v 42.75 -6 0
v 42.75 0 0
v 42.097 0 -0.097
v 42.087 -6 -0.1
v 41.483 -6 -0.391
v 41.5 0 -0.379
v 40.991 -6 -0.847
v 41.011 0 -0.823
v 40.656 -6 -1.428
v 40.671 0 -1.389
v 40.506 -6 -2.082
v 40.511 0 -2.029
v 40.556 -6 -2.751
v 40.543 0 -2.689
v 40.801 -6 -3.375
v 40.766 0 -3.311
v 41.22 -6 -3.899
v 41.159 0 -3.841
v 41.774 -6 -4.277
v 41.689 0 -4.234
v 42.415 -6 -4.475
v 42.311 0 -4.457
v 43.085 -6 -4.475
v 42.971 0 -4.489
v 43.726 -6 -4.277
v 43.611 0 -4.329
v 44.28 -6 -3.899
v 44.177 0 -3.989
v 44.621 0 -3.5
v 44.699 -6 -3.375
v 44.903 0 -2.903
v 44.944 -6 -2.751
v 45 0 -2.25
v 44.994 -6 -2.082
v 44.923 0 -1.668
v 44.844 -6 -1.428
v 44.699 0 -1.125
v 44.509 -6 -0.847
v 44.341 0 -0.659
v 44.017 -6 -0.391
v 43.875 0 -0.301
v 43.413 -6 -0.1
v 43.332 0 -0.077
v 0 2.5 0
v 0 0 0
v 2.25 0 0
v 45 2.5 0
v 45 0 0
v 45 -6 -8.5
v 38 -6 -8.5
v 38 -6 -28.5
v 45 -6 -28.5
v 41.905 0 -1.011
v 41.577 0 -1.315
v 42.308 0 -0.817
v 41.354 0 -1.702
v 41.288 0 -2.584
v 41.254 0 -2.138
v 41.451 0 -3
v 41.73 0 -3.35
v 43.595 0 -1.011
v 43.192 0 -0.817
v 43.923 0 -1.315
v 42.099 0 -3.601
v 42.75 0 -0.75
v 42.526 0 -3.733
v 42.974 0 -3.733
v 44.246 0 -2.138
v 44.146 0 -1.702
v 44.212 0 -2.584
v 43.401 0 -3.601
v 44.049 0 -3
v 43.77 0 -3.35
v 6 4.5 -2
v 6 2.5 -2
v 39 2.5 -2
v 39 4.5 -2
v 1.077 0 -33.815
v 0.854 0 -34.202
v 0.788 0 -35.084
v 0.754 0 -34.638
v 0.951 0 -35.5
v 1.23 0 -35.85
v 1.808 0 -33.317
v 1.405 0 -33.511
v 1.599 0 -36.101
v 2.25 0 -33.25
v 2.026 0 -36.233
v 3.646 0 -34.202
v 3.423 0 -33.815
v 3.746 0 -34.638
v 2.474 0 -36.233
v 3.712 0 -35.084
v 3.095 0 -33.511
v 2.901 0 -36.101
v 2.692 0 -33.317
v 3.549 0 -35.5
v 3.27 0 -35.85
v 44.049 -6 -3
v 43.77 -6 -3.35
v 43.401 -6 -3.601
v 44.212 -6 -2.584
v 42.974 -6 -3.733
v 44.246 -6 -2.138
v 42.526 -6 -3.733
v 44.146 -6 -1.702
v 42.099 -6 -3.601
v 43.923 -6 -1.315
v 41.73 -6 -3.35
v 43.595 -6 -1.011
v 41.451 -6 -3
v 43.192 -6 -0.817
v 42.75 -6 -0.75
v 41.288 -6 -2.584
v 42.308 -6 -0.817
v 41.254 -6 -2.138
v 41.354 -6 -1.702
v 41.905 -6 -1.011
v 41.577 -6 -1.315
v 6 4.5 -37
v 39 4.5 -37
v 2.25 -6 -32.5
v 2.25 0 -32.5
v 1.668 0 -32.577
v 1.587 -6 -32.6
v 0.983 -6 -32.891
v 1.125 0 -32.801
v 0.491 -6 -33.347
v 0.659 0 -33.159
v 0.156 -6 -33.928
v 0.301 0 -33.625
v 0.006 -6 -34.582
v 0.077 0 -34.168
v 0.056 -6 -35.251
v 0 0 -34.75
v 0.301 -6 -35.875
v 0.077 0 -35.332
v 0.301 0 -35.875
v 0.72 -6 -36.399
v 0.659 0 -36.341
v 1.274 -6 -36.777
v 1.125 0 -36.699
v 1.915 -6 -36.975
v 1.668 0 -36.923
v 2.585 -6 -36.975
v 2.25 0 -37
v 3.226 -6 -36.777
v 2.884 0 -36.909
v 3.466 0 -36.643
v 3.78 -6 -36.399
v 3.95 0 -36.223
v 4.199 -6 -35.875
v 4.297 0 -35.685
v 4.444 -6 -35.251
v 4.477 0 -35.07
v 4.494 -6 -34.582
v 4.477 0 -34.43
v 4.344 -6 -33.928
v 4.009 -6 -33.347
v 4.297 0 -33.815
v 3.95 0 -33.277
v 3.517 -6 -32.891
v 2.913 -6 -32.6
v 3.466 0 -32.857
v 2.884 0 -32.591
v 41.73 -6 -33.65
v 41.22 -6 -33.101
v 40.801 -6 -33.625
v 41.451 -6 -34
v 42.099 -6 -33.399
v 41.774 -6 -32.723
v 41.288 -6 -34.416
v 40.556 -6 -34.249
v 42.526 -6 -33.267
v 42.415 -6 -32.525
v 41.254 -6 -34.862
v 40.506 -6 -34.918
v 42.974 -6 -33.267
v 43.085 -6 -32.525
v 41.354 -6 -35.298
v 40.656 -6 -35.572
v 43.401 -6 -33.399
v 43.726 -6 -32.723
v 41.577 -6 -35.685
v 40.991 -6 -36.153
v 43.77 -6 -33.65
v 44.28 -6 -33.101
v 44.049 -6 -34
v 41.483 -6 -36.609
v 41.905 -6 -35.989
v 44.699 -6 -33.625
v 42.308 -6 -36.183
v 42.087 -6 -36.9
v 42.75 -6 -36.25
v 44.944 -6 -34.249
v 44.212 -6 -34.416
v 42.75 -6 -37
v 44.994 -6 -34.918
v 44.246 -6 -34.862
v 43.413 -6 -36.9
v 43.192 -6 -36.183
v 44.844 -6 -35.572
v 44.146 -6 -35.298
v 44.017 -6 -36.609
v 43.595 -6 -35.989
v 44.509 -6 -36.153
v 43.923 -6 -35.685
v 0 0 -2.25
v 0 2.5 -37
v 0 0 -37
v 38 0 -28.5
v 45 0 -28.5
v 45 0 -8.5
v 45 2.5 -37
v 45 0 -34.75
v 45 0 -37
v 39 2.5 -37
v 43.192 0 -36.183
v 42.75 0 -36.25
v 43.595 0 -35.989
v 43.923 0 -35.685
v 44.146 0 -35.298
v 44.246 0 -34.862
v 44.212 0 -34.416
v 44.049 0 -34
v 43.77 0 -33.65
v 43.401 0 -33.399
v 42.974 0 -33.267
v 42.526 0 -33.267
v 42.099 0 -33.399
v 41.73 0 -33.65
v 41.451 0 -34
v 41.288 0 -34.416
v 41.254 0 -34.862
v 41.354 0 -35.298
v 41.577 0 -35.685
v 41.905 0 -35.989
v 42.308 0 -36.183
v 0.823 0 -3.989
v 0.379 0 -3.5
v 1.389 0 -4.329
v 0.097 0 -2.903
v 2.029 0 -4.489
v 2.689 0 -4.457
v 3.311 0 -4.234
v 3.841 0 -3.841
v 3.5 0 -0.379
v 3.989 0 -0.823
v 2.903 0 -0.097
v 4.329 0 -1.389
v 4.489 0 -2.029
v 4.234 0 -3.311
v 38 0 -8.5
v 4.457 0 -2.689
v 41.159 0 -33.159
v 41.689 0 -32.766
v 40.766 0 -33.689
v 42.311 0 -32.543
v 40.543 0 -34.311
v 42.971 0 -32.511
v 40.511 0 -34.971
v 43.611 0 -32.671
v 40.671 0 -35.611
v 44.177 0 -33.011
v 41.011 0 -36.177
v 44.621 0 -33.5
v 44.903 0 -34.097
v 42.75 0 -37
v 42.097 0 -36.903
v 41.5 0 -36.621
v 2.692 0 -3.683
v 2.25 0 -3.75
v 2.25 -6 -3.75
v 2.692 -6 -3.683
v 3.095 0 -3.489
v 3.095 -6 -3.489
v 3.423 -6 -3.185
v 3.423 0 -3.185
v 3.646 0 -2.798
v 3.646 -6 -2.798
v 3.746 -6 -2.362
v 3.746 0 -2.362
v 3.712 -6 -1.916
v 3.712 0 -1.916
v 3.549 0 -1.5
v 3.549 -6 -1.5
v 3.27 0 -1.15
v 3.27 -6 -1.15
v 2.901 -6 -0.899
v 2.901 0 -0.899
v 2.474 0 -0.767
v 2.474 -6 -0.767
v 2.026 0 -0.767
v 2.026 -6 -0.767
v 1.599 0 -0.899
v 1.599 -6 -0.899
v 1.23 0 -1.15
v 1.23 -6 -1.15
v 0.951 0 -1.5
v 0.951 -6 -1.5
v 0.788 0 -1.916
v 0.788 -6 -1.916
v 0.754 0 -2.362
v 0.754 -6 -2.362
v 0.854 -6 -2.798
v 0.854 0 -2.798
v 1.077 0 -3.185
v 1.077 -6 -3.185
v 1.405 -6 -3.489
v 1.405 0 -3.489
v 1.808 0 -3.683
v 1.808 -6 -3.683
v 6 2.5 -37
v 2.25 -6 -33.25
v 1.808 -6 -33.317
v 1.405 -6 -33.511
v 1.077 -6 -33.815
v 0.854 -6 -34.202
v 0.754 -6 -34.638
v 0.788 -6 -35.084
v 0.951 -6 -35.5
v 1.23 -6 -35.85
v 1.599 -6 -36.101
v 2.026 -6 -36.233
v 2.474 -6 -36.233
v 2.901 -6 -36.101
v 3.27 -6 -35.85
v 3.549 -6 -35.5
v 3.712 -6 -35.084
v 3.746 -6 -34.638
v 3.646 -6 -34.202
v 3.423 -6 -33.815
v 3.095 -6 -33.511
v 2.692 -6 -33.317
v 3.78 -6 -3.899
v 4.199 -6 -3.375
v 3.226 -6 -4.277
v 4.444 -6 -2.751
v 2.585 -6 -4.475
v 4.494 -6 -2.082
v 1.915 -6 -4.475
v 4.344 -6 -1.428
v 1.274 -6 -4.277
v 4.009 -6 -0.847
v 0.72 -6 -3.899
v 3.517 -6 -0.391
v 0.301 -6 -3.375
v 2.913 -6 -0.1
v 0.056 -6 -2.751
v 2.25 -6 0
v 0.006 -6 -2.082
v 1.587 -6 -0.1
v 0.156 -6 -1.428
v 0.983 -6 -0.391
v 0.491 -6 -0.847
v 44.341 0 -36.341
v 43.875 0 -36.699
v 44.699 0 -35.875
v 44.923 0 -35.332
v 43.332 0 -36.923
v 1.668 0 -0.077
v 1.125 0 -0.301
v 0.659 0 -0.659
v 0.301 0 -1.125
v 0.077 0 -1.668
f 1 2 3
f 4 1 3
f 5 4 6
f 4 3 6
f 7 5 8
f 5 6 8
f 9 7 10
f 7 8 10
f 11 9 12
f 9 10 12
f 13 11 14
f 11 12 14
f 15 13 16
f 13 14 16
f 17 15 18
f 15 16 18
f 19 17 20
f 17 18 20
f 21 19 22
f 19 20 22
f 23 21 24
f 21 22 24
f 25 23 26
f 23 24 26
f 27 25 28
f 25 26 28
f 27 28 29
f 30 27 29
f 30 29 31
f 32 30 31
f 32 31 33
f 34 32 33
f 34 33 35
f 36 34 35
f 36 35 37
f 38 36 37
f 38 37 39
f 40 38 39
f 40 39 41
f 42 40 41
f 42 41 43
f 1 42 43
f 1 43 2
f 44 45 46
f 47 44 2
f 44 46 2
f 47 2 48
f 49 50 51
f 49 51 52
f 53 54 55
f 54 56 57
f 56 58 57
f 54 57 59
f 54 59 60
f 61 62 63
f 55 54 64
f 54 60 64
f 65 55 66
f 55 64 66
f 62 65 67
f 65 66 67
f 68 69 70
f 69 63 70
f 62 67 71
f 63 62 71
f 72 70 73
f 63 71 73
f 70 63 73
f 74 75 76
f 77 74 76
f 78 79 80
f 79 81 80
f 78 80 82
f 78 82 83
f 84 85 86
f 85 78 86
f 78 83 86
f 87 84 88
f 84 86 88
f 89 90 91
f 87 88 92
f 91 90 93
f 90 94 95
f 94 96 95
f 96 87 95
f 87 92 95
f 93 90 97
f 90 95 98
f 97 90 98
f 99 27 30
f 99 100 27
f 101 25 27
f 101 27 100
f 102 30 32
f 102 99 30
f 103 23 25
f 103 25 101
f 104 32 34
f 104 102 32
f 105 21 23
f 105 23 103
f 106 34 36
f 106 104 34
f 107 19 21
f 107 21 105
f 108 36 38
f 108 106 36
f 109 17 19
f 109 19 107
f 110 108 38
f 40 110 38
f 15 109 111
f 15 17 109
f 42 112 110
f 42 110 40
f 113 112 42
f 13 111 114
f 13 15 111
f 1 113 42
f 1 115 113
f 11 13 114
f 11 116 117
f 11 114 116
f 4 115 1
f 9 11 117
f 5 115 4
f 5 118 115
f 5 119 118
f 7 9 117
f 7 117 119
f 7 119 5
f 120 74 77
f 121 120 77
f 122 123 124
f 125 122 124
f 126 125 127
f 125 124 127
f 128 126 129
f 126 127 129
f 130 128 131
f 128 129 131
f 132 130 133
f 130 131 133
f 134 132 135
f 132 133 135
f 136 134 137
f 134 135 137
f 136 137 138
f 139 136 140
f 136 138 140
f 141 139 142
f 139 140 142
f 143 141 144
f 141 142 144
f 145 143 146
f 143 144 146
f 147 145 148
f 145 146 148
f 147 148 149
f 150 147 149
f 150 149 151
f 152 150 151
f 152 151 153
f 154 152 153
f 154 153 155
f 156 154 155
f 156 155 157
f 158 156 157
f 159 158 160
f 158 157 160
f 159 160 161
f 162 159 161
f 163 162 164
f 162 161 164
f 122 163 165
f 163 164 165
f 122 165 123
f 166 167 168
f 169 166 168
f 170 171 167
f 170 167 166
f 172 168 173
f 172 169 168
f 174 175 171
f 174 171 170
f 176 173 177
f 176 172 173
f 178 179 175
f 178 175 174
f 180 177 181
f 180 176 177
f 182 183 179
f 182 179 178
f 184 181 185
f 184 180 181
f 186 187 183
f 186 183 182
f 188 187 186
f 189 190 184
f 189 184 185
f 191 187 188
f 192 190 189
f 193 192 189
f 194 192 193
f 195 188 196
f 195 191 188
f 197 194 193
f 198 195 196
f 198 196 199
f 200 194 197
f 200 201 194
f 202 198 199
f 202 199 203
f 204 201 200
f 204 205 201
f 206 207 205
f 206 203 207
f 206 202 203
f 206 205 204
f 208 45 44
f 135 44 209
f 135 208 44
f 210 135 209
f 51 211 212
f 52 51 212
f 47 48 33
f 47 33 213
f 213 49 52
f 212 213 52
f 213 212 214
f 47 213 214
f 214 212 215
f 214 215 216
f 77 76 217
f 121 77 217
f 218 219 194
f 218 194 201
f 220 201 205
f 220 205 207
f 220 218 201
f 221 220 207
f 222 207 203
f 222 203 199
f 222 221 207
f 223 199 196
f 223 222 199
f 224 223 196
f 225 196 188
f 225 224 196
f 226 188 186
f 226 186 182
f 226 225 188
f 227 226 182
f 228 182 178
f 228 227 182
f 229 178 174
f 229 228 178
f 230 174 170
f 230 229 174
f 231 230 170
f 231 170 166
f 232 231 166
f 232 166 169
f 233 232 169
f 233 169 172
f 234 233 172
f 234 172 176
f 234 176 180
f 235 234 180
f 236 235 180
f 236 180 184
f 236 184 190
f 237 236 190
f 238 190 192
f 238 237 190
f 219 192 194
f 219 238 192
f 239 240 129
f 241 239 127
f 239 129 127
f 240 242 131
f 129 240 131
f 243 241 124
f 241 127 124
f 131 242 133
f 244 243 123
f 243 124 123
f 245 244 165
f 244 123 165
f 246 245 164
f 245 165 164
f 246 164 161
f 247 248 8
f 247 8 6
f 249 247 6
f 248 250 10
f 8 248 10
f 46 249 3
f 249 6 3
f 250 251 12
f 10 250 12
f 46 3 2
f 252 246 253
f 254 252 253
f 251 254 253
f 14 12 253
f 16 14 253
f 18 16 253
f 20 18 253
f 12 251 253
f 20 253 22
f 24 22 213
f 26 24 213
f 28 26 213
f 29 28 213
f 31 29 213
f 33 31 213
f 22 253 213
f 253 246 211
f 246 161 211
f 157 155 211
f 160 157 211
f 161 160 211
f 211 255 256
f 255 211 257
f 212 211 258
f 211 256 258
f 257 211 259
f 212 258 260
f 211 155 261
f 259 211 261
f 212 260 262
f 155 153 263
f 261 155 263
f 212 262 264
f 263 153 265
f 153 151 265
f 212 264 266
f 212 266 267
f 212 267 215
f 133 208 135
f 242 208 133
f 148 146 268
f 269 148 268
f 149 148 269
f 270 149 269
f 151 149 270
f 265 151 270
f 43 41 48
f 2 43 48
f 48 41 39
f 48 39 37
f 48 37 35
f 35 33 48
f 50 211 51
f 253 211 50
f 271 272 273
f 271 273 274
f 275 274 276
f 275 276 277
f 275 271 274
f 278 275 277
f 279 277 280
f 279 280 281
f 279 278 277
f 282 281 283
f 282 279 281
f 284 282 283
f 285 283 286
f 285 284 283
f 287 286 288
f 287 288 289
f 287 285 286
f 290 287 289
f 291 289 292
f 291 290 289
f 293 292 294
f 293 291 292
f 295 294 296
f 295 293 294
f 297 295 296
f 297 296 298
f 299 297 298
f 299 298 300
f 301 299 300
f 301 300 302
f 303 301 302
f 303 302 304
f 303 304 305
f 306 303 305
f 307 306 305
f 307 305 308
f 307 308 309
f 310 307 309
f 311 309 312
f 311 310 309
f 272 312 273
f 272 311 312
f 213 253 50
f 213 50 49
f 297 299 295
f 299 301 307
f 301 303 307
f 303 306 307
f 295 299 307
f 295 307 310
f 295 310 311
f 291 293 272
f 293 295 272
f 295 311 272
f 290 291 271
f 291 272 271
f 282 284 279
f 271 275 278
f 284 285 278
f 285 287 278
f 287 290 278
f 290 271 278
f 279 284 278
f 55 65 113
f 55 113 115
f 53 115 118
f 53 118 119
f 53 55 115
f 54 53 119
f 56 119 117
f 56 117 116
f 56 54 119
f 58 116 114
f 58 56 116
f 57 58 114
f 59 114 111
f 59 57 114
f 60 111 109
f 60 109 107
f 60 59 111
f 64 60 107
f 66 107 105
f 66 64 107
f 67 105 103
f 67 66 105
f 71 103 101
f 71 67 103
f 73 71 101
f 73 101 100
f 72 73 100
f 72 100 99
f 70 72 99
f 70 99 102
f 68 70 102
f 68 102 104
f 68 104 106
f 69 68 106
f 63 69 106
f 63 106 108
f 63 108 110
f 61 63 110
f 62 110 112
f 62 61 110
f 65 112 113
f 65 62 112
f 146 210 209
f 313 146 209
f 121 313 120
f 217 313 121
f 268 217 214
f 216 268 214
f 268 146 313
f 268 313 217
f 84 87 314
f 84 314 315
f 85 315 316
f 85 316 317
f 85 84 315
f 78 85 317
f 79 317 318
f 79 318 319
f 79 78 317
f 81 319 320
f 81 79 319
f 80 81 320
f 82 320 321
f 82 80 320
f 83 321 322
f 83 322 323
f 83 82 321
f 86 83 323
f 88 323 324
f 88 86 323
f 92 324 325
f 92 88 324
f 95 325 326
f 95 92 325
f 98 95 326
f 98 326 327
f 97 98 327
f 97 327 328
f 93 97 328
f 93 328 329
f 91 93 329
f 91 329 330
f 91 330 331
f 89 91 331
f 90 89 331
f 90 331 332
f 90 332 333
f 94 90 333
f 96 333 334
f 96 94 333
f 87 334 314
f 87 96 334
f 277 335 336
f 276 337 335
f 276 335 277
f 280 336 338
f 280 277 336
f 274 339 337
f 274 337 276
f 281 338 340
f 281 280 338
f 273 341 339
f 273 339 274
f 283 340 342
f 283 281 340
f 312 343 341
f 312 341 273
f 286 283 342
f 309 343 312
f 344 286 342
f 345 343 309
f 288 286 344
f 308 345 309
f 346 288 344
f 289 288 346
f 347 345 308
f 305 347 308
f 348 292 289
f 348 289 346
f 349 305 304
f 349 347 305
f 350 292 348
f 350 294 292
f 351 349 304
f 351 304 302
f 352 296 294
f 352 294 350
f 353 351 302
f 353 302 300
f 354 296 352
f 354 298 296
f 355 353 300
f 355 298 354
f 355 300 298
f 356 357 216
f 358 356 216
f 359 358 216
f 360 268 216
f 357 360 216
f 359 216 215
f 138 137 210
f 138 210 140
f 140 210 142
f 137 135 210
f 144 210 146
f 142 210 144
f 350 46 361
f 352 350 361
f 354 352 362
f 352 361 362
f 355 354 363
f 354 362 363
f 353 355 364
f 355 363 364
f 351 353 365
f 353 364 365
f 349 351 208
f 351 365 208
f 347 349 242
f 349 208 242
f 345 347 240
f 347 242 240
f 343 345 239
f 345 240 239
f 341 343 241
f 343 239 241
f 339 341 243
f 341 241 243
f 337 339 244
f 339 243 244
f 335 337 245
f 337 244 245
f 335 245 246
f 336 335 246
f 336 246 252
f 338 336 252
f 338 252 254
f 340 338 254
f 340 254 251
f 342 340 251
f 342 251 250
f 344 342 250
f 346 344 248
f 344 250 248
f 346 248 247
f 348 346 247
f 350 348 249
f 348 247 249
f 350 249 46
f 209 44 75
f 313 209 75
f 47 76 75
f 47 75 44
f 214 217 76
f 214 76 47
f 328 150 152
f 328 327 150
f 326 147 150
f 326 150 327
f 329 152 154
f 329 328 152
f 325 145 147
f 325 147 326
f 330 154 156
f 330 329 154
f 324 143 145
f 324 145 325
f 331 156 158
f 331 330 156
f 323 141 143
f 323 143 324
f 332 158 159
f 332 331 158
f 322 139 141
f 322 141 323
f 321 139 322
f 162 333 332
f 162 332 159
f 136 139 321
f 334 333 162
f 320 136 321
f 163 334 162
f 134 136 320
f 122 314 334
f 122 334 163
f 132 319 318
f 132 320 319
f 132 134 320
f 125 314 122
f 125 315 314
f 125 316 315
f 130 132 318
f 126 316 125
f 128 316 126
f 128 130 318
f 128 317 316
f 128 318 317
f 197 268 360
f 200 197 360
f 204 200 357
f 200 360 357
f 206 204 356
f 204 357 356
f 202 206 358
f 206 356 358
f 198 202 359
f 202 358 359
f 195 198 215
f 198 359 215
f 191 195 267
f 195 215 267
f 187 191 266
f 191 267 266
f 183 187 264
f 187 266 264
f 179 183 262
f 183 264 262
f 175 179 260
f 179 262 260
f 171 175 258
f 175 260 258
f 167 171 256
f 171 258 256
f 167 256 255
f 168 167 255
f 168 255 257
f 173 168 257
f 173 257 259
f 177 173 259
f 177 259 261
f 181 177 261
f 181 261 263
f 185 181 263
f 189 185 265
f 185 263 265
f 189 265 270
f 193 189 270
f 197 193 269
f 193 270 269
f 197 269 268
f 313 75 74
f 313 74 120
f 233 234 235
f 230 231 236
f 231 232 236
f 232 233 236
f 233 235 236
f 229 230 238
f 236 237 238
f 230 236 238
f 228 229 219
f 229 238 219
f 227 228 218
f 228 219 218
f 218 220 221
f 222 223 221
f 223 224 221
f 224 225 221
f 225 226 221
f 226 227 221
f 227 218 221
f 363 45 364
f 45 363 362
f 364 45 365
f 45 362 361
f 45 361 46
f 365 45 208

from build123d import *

# Parameters (mm, degrees)
SKETCH_1_W      = 45
SKETCH_1_H      = 37
EXTRUDE_1_DEPTH = 2.5
SKETCH_2_W      = 33
SKETCH_2_H      = 35
EXTRUDE_2_DEPTH = 2
SKETCH_3_R      = 2.25
SKETCH_3_R_2    = 1.5
SKETCH_3_W      = 7
SKETCH_3_H      = 20
EXTRUDE_3_DEPTH = 6


with BuildPart() as part:
    # 草图1 → 凸台-拉伸1 (new body)
    with BuildSketch(Plane(origin=(0, 0, 0), x_dir=(1, 0, 0), z_dir=(0, 1, 0))):
        with Locations((22.5, 18.5)):
            Rectangle(SKETCH_1_W, SKETCH_1_H)
    extrude(amount=EXTRUDE_1_DEPTH)

    # 草图2 → 凸台-拉伸2 (add)
    with BuildSketch(Plane(origin=(0, 2.5, 0), x_dir=(1, 0, 0), z_dir=(0, 1, 0))):
        with Locations((22.5, 19.5)):
            Rectangle(SKETCH_2_W, SKETCH_2_H)
    extrude(amount=EXTRUDE_2_DEPTH)

    # 草图3 → 凸台-拉伸3 (add)
    # profile 1 of 5: a face of its own
    with BuildSketch(Plane.XZ):
        with Locations(Location((42.75, -34.75, 0), (0, 0, 270))):
            Circle(SKETCH_3_R)
        with Locations(Location((42.75, -34.75, 0), (0, 0, 270))):
            Circle(SKETCH_3_R_2, mode=Mode.SUBTRACT)
    # profile 2 of 5: a face of its own
    with BuildSketch(Plane.XZ):
        with Locations(Location((42.75, -2.25, 0), (0, 0, 90))):
            Circle(SKETCH_3_R)
        with Locations(Location((42.75, -2.25, 0), (0, 0, 90))):
            Circle(SKETCH_3_R_2, mode=Mode.SUBTRACT)
    # profile 3 of 5: a face of its own
    with BuildSketch(Plane.XZ):
        with Locations(Location((2.25, -2.25, 0), (0, 0, 90))):
            Circle(SKETCH_3_R)
        with Locations(Location((2.25, -2.25, 0), (0, 0, 270))):
            Circle(SKETCH_3_R_2, mode=Mode.SUBTRACT)
    # profile 4 of 5: a face of its own
    with BuildSketch(Plane.XZ):
        with Locations(Location((2.25, -34.75, 0), (0, 0, 90))):
            Circle(SKETCH_3_R)
        with Locations(Location((2.25, -34.75, 0), (0, 0, 90))):
            Circle(SKETCH_3_R_2, mode=Mode.SUBTRACT)
    # profile 5 of 5: a face of its own
    with BuildSketch(Plane.XZ):
        with Locations((41.5, -18.5)):
            Rectangle(SKETCH_3_W, SKETCH_3_H)
    extrude(amount=EXTRUDE_3_DEPTH)


solid = part.part
